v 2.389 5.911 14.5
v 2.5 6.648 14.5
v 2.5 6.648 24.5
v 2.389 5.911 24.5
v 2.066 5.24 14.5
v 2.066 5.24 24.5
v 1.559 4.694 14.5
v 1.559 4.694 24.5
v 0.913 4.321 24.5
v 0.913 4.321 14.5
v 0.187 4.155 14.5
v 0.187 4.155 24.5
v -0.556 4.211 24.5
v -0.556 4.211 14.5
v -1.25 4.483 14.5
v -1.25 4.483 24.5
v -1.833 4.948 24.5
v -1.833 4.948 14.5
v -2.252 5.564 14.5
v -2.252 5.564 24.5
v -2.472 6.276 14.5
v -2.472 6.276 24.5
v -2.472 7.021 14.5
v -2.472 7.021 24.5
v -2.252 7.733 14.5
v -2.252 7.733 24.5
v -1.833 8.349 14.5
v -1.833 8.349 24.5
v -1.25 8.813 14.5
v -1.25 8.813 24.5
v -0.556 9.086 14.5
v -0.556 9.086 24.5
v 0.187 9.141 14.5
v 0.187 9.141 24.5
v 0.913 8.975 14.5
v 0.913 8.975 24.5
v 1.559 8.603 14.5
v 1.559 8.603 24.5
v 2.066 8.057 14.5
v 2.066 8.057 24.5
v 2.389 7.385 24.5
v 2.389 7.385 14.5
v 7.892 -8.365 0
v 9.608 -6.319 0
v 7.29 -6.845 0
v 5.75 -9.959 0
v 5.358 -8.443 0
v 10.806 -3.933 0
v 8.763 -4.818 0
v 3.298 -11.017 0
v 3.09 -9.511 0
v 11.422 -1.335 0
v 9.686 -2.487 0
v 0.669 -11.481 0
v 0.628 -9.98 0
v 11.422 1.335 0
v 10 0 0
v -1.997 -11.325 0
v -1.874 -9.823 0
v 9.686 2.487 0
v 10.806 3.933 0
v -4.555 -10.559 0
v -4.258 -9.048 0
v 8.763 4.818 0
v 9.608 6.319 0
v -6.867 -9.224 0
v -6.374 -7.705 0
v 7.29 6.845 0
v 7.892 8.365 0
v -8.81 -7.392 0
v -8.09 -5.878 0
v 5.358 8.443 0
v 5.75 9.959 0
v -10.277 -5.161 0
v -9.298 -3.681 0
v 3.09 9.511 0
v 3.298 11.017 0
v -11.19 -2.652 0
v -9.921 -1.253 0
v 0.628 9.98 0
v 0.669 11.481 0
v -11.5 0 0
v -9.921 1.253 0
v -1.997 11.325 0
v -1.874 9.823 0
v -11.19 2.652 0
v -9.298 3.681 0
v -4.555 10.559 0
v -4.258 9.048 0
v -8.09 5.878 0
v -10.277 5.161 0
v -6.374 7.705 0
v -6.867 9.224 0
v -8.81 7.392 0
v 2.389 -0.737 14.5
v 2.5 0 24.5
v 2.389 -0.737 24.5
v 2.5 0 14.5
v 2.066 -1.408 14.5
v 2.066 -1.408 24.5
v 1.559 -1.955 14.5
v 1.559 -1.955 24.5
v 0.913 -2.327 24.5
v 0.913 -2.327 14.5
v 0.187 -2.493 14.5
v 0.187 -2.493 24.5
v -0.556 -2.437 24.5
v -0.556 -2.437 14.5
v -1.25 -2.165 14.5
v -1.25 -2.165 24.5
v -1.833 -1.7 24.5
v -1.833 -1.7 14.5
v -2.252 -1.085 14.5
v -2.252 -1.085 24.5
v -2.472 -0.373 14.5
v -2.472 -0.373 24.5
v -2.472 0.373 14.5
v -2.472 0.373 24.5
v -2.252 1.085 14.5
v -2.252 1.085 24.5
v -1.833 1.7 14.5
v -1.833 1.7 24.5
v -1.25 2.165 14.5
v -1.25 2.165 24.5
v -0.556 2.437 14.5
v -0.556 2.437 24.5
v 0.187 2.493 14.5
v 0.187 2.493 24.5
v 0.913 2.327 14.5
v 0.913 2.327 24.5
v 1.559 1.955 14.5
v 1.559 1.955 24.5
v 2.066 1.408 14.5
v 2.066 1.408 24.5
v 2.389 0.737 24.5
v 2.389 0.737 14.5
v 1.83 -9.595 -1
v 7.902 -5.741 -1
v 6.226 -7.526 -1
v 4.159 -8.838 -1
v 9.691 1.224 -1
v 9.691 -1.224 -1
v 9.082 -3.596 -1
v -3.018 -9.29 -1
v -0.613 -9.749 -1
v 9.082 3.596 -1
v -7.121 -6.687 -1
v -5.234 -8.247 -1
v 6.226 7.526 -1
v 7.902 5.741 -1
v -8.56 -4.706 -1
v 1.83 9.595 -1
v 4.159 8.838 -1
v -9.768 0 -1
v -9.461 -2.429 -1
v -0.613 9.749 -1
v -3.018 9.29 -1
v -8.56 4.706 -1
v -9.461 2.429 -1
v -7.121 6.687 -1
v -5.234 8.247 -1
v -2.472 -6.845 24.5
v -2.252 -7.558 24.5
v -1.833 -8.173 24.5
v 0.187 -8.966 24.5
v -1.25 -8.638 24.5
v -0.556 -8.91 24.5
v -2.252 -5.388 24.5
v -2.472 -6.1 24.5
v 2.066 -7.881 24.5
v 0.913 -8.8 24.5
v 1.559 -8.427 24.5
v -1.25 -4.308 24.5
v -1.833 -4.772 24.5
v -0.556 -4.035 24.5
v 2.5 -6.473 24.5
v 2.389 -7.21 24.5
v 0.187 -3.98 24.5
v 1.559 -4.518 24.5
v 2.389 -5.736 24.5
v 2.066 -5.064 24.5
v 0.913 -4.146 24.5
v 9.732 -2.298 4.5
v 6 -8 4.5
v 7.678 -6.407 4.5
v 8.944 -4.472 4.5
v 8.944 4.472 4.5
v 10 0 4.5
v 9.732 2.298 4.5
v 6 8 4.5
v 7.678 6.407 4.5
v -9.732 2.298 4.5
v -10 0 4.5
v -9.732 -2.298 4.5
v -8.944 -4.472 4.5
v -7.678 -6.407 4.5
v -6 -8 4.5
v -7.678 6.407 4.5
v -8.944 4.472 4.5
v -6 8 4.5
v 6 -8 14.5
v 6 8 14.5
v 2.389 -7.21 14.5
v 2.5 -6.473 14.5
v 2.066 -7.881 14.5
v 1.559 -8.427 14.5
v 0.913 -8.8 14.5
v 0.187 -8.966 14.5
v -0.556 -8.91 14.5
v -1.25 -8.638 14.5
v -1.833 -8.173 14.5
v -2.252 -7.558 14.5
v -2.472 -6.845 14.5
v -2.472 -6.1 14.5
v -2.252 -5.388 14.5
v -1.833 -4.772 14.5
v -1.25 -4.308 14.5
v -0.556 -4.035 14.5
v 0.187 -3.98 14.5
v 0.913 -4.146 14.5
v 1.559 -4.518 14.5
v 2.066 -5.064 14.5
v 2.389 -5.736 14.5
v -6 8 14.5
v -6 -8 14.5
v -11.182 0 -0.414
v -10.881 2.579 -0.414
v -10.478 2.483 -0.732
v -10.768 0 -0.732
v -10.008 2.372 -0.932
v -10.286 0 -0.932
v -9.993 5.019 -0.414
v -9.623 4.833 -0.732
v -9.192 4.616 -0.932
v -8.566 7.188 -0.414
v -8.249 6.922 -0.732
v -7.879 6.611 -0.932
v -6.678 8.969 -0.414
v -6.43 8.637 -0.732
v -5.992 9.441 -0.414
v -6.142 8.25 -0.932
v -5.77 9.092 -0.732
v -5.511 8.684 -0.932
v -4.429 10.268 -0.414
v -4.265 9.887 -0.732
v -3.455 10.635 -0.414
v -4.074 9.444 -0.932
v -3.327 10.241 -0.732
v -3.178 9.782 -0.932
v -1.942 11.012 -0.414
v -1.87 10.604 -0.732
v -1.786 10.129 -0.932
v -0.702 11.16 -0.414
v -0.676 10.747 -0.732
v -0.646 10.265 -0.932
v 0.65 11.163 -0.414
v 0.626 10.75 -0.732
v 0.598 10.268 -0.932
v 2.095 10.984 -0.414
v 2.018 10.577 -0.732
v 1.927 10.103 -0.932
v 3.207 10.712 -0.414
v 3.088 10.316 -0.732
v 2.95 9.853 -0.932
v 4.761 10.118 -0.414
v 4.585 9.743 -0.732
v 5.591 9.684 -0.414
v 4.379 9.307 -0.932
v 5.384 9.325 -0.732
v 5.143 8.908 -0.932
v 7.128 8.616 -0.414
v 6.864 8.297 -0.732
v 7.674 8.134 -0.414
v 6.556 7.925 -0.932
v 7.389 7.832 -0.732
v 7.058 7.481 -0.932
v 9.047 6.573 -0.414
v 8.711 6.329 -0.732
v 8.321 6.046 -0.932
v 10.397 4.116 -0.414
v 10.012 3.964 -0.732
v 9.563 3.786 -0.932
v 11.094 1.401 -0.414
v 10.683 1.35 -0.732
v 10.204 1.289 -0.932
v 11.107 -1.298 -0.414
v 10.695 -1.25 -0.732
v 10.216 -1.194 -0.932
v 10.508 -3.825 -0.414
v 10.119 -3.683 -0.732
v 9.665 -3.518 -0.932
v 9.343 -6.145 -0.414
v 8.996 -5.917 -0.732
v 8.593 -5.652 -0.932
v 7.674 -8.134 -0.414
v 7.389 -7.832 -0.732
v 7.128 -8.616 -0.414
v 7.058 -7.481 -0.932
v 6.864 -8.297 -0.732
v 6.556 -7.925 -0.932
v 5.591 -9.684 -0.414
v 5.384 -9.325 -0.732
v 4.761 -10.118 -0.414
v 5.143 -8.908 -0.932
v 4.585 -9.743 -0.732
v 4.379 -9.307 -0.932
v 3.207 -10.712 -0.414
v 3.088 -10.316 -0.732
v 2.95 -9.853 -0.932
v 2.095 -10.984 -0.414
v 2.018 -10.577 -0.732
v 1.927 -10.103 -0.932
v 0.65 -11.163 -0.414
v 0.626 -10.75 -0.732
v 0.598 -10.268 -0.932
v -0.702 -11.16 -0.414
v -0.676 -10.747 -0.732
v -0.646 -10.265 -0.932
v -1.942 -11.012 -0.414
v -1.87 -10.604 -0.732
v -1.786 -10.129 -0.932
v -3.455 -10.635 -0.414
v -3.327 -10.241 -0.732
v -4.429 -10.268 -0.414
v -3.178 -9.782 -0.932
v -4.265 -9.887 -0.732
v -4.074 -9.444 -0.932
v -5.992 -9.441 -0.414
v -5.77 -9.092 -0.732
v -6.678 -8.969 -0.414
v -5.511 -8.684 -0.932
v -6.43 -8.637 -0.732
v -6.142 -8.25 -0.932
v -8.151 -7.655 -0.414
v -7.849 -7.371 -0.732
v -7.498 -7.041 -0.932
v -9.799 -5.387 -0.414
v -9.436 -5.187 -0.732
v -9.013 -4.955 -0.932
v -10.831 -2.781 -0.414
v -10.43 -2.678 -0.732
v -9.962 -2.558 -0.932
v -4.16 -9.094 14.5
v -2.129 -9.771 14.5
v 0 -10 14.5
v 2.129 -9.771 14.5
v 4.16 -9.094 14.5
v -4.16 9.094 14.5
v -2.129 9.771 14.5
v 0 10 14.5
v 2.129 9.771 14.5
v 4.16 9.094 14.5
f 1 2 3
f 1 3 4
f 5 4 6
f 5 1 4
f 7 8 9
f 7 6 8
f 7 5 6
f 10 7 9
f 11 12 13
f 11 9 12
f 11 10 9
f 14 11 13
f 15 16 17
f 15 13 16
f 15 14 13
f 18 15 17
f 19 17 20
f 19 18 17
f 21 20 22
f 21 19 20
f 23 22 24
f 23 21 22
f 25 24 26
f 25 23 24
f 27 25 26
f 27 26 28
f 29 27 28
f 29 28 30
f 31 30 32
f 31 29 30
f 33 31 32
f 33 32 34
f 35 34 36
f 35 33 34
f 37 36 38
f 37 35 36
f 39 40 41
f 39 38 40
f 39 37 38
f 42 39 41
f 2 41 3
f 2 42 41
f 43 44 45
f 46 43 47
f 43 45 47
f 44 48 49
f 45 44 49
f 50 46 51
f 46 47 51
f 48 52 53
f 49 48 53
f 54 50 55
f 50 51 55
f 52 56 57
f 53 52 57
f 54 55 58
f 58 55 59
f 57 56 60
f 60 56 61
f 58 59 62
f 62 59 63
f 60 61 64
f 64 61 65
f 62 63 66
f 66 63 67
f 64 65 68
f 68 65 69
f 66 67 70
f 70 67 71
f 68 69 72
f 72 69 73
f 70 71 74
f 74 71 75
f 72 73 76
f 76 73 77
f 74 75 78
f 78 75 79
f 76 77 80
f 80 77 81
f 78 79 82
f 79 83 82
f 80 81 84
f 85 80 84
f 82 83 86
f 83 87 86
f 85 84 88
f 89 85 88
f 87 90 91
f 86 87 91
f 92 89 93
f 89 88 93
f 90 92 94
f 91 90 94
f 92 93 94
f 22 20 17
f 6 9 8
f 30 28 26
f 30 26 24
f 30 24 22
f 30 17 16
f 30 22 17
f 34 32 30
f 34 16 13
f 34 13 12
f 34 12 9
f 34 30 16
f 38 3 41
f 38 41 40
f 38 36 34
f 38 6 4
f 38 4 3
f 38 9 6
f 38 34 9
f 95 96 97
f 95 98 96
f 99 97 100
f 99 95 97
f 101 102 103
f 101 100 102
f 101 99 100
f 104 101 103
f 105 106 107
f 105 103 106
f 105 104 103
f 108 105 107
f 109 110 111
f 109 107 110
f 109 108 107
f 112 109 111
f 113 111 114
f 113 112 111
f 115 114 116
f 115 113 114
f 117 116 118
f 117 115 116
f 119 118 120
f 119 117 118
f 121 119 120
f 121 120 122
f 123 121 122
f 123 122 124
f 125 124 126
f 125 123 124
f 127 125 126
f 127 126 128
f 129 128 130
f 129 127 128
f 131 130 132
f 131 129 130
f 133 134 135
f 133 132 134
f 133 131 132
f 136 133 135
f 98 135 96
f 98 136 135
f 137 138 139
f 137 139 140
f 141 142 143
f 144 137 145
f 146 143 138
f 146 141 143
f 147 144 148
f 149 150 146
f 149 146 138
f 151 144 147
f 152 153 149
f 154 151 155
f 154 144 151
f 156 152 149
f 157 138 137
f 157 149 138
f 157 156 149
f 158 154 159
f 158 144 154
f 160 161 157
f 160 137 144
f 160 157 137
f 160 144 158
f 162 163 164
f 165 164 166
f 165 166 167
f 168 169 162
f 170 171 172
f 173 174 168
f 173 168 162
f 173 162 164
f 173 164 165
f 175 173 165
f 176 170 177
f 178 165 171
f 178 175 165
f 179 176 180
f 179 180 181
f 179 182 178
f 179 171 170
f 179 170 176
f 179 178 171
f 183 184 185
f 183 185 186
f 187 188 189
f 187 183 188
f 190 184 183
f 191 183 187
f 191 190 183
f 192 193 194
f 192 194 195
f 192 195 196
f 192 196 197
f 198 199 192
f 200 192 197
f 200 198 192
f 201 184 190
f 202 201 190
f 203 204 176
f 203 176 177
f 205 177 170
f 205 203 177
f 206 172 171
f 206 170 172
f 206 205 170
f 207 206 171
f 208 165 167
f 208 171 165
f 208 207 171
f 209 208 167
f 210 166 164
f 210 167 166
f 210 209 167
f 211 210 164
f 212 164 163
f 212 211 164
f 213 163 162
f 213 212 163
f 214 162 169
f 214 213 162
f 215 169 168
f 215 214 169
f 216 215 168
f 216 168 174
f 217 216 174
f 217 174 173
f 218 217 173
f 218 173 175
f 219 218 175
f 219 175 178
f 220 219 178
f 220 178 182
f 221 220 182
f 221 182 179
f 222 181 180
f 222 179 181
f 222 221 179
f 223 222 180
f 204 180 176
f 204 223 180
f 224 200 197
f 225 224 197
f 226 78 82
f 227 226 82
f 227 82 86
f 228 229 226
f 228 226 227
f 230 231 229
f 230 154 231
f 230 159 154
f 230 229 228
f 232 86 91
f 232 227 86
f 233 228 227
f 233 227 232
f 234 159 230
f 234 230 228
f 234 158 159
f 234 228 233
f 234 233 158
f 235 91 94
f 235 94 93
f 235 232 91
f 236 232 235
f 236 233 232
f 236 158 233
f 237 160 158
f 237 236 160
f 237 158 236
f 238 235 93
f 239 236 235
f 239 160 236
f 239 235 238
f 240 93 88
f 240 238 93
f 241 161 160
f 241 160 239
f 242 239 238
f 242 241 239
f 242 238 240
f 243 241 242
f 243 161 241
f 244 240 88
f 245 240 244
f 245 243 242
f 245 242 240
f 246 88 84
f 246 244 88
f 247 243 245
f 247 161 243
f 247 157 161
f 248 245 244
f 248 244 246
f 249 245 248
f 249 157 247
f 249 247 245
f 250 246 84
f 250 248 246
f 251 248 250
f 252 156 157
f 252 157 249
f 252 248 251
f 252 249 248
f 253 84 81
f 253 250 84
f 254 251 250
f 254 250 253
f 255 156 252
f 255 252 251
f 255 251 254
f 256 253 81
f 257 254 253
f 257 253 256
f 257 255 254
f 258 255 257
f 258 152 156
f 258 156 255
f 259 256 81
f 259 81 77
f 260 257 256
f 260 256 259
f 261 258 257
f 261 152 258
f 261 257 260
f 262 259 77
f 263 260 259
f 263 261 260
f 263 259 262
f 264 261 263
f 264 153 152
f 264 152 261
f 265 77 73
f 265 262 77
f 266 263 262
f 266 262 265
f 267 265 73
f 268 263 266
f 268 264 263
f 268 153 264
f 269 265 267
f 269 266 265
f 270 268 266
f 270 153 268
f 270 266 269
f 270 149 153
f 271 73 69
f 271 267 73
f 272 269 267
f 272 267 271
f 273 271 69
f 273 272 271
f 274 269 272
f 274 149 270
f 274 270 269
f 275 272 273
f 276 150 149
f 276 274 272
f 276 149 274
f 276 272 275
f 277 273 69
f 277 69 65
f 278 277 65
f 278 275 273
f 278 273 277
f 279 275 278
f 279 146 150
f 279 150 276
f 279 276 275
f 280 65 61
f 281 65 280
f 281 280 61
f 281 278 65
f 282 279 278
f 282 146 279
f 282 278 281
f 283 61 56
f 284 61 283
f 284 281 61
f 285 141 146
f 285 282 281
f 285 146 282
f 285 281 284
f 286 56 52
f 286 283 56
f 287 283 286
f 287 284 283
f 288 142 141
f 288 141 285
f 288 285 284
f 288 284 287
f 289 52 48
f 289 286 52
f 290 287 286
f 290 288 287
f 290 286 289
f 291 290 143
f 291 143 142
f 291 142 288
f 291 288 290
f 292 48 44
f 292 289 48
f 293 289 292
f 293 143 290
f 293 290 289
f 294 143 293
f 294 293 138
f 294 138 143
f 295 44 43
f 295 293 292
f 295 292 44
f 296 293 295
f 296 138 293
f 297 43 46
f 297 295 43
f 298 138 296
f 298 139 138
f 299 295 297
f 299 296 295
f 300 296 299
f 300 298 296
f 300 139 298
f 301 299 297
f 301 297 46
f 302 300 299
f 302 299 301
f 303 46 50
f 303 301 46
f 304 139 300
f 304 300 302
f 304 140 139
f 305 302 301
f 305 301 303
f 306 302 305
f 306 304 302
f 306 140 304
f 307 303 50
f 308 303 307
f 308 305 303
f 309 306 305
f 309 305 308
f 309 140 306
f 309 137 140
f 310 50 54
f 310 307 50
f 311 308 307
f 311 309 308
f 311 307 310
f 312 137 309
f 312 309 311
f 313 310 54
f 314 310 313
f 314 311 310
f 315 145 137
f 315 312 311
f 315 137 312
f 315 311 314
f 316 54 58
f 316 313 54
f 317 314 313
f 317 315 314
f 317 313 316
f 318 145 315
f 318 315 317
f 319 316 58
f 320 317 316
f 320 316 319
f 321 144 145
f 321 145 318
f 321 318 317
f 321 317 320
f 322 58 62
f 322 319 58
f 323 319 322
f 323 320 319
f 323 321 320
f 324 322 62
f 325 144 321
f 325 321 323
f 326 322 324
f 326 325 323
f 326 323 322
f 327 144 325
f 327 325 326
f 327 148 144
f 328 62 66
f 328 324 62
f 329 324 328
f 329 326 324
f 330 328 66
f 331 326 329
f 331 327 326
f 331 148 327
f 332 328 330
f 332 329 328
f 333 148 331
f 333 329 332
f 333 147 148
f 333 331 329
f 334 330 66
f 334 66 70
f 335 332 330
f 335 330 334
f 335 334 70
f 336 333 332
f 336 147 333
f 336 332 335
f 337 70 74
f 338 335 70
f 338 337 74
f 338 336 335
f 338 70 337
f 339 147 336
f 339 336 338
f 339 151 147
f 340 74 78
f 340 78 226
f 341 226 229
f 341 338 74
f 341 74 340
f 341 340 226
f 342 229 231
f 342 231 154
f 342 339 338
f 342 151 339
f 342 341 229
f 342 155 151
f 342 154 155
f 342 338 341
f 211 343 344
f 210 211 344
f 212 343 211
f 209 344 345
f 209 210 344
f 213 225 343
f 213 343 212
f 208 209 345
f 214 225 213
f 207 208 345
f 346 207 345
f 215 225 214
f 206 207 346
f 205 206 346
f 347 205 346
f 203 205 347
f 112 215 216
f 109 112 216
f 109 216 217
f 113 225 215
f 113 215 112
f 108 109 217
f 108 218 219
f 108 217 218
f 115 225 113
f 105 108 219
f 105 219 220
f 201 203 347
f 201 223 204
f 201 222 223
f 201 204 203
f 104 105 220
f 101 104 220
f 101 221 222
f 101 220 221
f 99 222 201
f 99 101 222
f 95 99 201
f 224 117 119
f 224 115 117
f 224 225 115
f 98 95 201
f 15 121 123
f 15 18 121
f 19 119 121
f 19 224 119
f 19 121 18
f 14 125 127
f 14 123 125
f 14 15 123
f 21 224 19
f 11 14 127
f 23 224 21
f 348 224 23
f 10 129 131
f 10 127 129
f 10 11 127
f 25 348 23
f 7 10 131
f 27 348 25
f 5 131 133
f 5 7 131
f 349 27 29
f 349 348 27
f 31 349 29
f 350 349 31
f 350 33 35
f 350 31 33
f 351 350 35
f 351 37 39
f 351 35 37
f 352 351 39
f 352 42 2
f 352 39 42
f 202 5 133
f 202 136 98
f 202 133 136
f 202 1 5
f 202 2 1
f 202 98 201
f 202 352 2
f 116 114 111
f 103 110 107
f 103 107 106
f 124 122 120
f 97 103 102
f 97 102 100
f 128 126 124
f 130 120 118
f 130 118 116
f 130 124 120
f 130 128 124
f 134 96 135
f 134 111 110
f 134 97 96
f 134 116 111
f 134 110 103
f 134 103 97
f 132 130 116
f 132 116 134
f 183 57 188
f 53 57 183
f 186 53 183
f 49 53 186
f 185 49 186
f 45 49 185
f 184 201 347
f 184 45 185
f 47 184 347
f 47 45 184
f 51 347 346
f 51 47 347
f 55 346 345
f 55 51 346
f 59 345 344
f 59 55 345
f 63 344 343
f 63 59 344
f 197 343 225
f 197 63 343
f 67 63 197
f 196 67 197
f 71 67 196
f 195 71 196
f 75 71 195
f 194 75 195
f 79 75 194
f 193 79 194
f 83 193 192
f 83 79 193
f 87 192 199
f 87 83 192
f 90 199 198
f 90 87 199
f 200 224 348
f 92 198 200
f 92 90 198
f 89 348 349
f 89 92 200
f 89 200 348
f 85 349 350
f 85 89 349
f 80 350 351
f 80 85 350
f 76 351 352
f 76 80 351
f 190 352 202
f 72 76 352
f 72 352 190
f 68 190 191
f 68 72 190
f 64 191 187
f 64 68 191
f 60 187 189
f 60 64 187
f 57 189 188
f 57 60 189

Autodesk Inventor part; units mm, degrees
ref_plane "YZ Plane" through (0, 0, 0) normal (1, 0, 0) x (0, 1, 0)
ref_plane "XZ Plane" through (0, 0, 0) normal (0, 1, 0) x (-1, 0, 0)
ref_plane "XY Plane" through (0, 0, 0) normal (0, 0, 1) x (1, 0, 0)
sketch "Sketch1" plane through (0, 0, 0) normal (0, 0, 1) x (1, 0, 0)
  circle A0 centre (0, 0) radius 10
  dimension "d0" = 20
extrude "Extrusion1" add sketch "Sketch1" along normal blind 4.5
sketch "Sketch2" plane through (0, 0, 4.5) normal (0, 0, 1) x (1, 0, 0)
  circle A0 centre (0, 0) radius 10 projected
  line L0 (-6, -8) -> (6, -8)
  line L1 (6, -8) -> (6, 8)
  line L2 (6, 8) -> (-6, 8)
  line L3 (-6, 8) -> (-6, -8)
  line L4 (-6, -8) -> (6, 8) construction
  line L5 (6, -8) -> (-6, 8) construction
  arc A1 (6, 8) -> (-6, 8) centre (0, 0) ccw
  arc A2 (-6, -8) -> (6, -8) centre (0, 0) ccw
  dimension "d3" = 12
extrude "Extrusion2" add sketch "Sketch2" along normal blind 10 contours L2 A0 | L1 L0 L3 L2 | A0 L0
sketch "Sketch3" plane through (0, 0, 0) normal (0, 0, -1) x (-1, 0, 0)
  circle A0 centre (0, 0) radius 11.5
  dimension "d6" = 23
extrude "Extrusion3" add sketch "Sketch3" along normal blind 1
fillet "Fillet1" radius 2 1 edges at (11.5, 0, -1)
sketch "Sketch4" plane through (0, 0, 14.5) normal (0, 0, 1) x (1, 0, 0)
  circle A0 centre (0, 6.6483) radius 2.5
  circle A1 centre (0, 0) radius 2.5
  circle A2 centre (0, -6.4728) radius 2.5
  dimension "d10" = 5
  dimension "d11" = 5
  dimension "d12" = 5
extrude "Extrusion4" add sketch "Sketch4" along normal blind 10
properties part number "Switch_DC_Pilot"
